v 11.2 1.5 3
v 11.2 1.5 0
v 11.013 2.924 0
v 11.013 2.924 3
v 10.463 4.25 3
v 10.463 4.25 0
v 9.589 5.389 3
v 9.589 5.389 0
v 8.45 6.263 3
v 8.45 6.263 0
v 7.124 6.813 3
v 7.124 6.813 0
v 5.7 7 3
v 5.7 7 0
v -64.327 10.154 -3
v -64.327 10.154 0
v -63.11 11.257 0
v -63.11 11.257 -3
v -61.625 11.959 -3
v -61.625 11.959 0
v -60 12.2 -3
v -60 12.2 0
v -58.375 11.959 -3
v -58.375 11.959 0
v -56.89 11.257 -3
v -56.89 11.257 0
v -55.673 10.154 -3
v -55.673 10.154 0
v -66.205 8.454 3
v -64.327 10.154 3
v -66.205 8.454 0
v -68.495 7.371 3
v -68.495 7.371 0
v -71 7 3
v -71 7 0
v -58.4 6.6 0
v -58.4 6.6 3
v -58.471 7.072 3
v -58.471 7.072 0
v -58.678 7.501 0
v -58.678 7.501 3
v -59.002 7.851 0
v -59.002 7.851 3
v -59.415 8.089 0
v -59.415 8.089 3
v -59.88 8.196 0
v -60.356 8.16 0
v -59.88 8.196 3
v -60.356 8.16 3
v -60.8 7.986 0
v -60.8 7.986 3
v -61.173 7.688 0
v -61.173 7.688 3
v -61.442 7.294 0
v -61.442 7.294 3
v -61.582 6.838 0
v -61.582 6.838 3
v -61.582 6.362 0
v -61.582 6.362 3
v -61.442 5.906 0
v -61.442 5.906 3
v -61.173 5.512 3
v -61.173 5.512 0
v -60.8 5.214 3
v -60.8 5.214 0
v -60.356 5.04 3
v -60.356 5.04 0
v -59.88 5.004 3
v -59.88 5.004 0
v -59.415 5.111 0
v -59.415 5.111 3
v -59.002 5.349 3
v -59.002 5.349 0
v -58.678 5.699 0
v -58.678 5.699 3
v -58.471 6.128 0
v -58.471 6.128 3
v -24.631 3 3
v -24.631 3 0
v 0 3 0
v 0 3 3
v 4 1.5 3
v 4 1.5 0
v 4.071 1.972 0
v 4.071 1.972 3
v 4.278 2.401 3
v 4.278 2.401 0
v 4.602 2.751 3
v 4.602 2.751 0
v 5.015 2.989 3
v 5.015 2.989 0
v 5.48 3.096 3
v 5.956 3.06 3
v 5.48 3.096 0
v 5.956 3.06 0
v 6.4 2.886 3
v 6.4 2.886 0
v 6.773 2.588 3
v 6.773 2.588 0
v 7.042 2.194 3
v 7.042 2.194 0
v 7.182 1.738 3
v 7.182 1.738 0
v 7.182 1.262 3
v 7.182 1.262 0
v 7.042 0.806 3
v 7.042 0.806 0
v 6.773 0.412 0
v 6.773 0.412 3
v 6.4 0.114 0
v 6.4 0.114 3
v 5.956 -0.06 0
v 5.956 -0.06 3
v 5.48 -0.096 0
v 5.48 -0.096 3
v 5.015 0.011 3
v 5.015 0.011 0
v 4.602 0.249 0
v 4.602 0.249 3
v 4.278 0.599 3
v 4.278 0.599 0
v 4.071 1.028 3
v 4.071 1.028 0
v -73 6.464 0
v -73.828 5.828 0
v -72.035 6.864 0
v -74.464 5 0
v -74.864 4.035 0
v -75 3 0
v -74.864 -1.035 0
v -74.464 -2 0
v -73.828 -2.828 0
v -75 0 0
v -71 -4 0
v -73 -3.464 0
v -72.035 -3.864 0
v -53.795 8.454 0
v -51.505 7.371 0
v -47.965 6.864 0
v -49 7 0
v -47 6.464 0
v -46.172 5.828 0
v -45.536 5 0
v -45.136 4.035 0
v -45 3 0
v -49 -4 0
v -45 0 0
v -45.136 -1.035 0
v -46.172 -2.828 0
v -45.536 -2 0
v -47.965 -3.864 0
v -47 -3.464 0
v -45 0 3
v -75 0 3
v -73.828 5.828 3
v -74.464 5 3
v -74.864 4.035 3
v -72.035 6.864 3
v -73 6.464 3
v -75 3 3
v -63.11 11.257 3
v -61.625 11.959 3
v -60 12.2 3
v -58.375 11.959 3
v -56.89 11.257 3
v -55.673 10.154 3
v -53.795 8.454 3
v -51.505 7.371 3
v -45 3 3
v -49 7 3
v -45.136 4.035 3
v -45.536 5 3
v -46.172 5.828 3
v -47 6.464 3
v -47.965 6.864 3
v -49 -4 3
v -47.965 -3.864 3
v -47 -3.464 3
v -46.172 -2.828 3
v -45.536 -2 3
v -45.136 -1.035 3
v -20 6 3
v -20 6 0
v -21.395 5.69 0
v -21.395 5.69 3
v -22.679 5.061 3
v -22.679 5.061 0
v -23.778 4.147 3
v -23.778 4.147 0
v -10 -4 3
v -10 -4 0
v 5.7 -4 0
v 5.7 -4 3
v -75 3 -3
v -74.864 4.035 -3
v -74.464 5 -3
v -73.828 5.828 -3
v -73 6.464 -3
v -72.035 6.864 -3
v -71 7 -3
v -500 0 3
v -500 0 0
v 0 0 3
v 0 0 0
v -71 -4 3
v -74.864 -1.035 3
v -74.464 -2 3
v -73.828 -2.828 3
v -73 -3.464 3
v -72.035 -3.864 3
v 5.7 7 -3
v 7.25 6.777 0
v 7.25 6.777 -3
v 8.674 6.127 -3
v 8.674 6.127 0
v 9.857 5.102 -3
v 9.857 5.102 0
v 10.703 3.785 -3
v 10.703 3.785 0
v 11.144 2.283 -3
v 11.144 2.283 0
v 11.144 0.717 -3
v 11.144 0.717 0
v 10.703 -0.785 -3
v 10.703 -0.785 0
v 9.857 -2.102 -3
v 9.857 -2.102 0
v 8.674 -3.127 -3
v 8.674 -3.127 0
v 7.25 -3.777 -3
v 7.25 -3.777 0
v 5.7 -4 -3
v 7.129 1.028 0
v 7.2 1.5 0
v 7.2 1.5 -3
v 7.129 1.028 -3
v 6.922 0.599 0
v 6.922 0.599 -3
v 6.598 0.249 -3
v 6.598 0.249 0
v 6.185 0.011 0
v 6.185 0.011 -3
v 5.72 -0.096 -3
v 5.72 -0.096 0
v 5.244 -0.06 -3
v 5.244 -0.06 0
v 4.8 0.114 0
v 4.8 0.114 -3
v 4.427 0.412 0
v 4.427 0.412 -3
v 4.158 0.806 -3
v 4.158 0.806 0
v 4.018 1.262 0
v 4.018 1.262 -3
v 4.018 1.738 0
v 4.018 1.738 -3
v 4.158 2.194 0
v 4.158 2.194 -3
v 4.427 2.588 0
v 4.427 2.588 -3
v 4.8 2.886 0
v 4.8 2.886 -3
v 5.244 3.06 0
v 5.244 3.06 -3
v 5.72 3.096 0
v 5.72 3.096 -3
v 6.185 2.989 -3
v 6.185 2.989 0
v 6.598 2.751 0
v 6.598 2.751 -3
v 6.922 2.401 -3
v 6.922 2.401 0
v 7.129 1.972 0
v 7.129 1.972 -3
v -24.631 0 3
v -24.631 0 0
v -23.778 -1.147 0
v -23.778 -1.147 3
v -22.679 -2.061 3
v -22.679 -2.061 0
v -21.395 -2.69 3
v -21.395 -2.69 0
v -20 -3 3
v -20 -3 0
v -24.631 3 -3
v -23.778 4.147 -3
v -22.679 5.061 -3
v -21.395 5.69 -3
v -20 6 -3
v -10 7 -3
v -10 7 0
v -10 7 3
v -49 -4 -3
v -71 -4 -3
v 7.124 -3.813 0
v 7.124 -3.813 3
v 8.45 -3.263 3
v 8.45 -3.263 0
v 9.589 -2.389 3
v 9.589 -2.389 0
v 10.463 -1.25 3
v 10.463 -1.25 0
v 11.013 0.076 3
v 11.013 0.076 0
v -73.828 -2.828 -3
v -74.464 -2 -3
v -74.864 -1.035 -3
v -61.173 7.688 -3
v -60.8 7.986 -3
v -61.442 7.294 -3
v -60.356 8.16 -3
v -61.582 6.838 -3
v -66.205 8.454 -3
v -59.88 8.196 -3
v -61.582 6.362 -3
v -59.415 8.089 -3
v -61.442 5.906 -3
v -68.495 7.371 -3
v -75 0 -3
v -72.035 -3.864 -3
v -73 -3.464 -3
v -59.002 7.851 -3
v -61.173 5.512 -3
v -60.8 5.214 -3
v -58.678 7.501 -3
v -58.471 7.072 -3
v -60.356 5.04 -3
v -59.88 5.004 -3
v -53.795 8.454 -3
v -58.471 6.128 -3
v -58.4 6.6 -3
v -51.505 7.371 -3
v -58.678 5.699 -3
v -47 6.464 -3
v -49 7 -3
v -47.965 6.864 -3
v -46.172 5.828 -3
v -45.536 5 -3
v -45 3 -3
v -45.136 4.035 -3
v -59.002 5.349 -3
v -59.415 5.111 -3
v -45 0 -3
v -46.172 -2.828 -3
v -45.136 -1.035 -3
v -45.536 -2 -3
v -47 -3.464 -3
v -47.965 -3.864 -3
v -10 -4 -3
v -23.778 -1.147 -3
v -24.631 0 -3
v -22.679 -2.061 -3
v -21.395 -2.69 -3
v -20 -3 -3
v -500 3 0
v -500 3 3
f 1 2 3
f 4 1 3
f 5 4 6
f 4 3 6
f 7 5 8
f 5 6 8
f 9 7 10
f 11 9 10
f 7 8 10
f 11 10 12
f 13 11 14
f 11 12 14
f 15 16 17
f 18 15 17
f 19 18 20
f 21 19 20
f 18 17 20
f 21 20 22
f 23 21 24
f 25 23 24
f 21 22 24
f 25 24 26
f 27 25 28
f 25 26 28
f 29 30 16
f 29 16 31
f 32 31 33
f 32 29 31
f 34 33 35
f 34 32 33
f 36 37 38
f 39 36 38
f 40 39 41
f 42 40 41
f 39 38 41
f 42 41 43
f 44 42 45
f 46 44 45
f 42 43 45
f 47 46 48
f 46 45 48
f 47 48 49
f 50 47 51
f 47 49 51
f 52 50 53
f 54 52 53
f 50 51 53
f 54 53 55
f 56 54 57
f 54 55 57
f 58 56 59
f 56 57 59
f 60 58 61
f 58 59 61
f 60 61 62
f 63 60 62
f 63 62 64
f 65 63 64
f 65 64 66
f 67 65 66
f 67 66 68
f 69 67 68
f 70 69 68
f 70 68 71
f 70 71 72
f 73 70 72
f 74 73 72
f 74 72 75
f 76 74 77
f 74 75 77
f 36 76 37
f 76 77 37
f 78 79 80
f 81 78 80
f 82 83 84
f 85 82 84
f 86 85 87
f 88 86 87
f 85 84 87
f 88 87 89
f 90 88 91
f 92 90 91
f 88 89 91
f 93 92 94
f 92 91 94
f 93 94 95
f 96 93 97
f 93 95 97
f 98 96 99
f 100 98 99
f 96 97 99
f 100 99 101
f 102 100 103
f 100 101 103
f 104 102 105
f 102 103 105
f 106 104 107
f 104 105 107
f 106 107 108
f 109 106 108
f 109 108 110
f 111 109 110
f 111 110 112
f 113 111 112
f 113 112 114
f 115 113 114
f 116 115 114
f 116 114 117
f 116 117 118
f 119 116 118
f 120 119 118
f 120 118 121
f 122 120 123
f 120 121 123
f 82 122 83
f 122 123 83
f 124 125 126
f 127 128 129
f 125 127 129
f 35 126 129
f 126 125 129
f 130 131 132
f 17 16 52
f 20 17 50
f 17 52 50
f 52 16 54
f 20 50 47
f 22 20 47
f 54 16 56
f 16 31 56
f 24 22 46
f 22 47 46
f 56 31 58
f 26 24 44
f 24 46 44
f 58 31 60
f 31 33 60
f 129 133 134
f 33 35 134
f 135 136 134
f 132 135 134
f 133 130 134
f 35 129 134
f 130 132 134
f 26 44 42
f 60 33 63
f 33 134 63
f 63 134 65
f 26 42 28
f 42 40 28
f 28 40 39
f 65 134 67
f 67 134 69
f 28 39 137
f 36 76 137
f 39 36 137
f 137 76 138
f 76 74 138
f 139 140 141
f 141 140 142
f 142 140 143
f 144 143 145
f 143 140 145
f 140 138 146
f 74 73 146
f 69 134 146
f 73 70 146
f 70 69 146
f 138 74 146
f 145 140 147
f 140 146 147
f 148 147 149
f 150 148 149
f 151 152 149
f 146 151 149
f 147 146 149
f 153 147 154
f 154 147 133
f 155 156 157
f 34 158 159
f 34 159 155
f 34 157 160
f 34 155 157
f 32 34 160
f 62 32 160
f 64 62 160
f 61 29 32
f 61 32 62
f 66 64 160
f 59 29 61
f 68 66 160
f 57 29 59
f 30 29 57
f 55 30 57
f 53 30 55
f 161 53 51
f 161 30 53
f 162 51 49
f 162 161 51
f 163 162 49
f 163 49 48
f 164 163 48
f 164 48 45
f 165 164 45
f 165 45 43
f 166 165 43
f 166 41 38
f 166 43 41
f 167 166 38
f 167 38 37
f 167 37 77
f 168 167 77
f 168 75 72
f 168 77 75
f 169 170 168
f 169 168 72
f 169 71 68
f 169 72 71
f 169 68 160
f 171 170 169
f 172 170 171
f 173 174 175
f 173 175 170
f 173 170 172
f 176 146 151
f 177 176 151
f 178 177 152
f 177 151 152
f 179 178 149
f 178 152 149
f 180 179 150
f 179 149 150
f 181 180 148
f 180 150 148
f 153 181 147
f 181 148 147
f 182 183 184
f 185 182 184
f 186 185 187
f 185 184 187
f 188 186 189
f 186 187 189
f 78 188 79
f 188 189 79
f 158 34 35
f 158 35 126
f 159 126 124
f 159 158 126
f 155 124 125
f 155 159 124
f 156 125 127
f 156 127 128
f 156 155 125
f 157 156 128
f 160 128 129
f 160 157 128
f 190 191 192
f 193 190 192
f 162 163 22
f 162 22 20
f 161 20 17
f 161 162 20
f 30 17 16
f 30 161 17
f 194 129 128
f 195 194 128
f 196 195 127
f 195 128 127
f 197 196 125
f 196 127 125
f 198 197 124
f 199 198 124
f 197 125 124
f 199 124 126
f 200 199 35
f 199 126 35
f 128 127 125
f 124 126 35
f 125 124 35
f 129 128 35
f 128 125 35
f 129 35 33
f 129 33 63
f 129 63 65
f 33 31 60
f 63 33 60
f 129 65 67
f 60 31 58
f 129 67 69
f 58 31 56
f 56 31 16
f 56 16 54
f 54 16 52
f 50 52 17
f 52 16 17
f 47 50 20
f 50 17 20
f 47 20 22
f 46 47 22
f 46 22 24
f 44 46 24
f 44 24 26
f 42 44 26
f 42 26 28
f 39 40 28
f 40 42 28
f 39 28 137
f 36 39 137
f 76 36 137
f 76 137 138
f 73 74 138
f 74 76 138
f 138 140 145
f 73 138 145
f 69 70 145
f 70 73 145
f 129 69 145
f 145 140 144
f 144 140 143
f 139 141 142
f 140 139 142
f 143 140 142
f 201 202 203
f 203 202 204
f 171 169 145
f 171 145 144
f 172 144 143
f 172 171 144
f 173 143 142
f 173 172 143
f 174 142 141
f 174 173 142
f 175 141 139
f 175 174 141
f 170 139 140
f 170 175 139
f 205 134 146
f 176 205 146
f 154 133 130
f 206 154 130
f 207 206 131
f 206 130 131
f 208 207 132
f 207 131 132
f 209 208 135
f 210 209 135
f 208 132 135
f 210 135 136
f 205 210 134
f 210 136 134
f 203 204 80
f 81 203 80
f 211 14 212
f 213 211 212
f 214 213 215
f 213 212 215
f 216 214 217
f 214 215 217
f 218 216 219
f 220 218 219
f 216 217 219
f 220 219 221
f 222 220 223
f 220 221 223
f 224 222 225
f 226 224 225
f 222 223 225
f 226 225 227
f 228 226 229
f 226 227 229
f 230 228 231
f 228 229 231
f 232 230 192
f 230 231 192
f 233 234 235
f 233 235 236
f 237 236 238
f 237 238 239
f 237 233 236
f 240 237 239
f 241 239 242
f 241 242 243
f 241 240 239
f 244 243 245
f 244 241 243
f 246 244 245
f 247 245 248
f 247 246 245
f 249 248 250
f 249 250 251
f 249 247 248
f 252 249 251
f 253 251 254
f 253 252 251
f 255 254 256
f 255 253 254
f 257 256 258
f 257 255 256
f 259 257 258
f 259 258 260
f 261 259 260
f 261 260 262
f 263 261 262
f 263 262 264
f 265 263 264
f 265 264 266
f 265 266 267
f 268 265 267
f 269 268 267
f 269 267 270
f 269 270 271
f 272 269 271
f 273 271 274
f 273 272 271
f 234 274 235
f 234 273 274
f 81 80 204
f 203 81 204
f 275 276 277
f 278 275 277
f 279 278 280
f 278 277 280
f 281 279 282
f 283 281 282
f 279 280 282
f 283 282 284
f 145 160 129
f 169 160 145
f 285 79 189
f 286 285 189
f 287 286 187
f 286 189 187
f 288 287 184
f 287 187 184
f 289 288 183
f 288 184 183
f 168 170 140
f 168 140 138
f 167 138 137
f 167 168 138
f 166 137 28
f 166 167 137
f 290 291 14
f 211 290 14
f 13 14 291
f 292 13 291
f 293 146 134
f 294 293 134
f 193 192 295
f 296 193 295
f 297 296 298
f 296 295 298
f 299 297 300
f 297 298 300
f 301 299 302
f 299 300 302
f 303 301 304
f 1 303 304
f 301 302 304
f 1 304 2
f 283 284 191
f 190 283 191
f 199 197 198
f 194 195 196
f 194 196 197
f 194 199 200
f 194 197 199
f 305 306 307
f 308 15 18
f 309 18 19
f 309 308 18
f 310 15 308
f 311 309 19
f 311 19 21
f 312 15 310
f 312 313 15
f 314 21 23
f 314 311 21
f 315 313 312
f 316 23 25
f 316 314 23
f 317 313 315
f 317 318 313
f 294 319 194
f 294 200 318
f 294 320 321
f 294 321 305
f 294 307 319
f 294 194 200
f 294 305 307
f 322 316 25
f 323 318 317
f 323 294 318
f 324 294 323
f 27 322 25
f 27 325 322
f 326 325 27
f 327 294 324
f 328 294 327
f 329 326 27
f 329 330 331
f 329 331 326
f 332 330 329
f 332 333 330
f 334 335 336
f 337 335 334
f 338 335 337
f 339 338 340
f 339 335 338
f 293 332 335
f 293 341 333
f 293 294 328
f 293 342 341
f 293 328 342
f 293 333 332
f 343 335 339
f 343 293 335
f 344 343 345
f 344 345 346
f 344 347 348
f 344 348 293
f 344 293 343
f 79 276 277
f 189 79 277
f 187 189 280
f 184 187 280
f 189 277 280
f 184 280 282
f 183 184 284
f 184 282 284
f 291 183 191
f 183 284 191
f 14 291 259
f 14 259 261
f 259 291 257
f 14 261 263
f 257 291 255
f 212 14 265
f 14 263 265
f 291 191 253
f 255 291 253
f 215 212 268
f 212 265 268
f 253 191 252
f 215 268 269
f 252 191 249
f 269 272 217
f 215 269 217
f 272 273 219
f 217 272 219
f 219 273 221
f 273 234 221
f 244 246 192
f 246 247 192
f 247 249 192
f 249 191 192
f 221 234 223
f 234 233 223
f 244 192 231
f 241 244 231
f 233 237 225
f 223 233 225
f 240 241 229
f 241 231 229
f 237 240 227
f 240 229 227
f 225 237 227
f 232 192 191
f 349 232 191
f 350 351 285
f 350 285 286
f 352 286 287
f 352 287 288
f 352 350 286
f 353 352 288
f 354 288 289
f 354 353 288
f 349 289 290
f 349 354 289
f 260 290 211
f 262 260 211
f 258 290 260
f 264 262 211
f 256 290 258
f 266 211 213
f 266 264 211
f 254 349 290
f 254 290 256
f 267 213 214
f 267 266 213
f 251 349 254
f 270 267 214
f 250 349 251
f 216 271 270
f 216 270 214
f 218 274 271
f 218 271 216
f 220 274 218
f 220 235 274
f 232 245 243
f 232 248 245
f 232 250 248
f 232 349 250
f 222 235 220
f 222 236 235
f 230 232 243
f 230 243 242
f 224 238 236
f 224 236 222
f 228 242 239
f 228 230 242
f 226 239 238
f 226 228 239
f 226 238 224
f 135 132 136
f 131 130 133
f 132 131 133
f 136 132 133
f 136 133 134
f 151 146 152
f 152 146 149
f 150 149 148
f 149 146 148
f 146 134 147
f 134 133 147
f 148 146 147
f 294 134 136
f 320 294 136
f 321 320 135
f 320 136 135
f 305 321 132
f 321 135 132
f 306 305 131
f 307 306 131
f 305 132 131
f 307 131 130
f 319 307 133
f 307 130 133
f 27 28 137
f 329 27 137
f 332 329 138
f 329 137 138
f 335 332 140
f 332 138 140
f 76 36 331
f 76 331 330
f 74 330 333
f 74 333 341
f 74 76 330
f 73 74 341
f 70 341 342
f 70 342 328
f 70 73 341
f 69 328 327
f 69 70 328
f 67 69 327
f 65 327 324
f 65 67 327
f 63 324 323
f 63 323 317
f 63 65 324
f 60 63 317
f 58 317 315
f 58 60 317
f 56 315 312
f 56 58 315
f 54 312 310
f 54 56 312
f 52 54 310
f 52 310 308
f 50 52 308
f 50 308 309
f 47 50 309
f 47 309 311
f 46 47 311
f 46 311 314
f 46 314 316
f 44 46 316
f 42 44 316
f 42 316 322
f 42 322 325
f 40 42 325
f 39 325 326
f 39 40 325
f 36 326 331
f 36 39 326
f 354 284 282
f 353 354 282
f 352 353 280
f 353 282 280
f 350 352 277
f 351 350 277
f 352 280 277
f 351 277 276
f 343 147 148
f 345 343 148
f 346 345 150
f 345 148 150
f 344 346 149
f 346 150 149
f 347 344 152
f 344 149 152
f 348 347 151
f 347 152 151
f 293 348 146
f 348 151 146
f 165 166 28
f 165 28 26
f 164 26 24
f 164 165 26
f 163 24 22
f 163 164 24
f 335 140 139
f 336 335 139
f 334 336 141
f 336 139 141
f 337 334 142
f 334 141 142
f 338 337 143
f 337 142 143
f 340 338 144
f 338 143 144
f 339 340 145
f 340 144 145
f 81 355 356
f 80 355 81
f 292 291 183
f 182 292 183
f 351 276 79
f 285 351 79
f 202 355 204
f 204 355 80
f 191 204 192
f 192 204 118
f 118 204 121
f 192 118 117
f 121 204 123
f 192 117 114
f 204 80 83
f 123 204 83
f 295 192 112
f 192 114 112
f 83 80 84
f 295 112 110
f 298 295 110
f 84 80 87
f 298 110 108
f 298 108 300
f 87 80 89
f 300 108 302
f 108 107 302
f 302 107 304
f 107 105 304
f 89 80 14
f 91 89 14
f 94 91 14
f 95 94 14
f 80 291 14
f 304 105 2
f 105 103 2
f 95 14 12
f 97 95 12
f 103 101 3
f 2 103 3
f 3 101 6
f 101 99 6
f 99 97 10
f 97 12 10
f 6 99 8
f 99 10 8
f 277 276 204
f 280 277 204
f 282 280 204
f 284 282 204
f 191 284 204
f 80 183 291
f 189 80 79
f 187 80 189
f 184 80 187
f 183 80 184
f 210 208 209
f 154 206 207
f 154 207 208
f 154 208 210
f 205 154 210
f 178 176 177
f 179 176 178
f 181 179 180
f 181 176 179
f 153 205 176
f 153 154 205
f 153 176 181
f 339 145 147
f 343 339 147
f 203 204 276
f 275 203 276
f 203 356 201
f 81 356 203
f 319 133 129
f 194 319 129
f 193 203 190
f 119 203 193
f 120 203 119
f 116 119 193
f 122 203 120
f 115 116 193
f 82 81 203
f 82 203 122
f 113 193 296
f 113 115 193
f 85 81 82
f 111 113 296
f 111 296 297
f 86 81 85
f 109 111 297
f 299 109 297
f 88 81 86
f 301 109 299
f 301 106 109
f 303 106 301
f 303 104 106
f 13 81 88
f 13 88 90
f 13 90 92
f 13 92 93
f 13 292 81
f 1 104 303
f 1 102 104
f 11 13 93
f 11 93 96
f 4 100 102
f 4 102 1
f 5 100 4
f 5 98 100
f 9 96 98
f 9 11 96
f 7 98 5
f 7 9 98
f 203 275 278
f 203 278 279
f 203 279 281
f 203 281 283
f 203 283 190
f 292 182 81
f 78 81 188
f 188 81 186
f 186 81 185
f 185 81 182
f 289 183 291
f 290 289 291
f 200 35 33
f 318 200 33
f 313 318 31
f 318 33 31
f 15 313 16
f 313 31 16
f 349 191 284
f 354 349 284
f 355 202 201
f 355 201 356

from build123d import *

# Parameters (mm, degrees)
F0_W      = 500
F0_H      = 3
F1_DEPTH  = 3
F3_DEPTH  = 3
F4_R      = 1.6
F5_DEPTH  = 3
F6_R      = 1.6
F7_DEPTH  = 3
F8_R      = 1.6
F9_DEPTH  = 3
F11_DEPTH = 3


with BuildPart() as f1:
    # F0 (on Top) → F1 (new body)
    with BuildSketch(Plane.XY):
        with Locations((-250, 1.5)):
            Rectangle(F0_W, F0_H)
    extrude(amount=F1_DEPTH)


with BuildPart() as f3:
    # F2 (on Top) → F3 (new body, through all)
    with BuildSketch(Plane.XY):
        with BuildLine():
            Line((0, 3), (0, 0))
            Line((0, 0), (-24.6306787322, 0))
            ThreePointArc((-24.6306787322, 0), (-22.678597813, -2.0607110548), (-20, -3))
            Line((-20, -3), (-10, -4))
            Line((-10, -4), (0, -4))
            Line((0, -4), (5.7, -4))
            ThreePointArc((5.7, -4), (9.5890872965, -2.3890872965), (11.2, 1.5))
            ThreePointArc((11.2, 1.5), (9.5890872965, 5.3890872965), (5.7, 7))
            Line((5.7, 7), (0, 7))
            Line((0, 7), (-10, 7))
            Line((-10, 7), (-20, 6))
            ThreePointArc((-20, 6), (-22.678597813, 5.0607110548), (-24.6306787322, 3))
            Line((-24.6306787322, 3), (0, 3))
        make_face()
        with BuildLine():
            ThreePointArc((7.2, 1.5), (5.6, -0.1), (4, 1.5))
            ThreePointArc((4, 1.5), (5.6, 3.1), (7.2, 1.5))
        make_face(mode=Mode.SUBTRACT)
    extrude(amount=F3_DEPTH)


with BuildPart() as f5:
    # F4 (on face) → F5 (new body)
    with BuildSketch(Plane(origin=(0, 0, 0), x_dir=(1, 0, 0), z_dir=(0, 0, -1))):
        with BuildLine():
            Line((5.7, 4), (-10, 4))
            Line((-10, 4), (-20, 3))
            ThreePointArc((-20, 3), (-22.678597813, 2.0607110548), (-24.6306787322, 0))
            Line((-24.6306787322, 0), (-24.6306787322, -3))
            ThreePointArc((-24.6306787322, -3), (-22.678597813, -5.0607110548), (-20, -6))
            Line((-20, -6), (-10, -7))
            Line((-10, -7), (5.7, -7))
            ThreePointArc((5.7, -7), (11.2, -1.5), (5.7, 4))
        make_face()
        with Locations((5.6, -1.5)):
            Circle(F4_R, mode=Mode.SUBTRACT)
    extrude(amount=F5_DEPTH)


with BuildPart() as f7:
    # F6 (on face) → F7 (new body, through all)
    with BuildSketch(Plane.XY.offset(3)):
        with BuildLine():
            Line((-75, 3), (-60, 3))
            Line((-60, 3), (-45, 3))
            ThreePointArc((-45, 3), (-46.1715728753, 5.8284271247), (-49, 7))
            ThreePointArc((-49, 7), (-52.6902586151, 7.8282990834), (-55.6725209403, 10.1542826263))
            ThreePointArc((-55.6725209403, 10.1542826263), (-57.6066741454, 11.6628046924), (-60, 12.2))
            ThreePointArc((-60, 12.2), (-62.3933258546, 11.6628046924), (-64.3274790597, 10.1542826263))
            ThreePointArc((-64.3274790597, 10.1542826263), (-67.3097413849, 7.8282990834), (-71, 7))
            ThreePointArc((-71, 7), (-73.8284271247, 5.8284271247), (-75, 3))
        make_face()
        with Locations((-60, 6.6)):
            Circle(F6_R, mode=Mode.SUBTRACT)
    extrude(amount=-F7_DEPTH)


with BuildPart() as f9:
    # F8 (on face) → F9 (new body)
    with BuildSketch(Plane(origin=(0, 0, 0), x_dir=(1, 0, 0), z_dir=(0, 0, -1))):
        with BuildLine():
            Line((-75, 0), (-75, -3))
            ThreePointArc((-75, -3), (-73.8284271247, -5.8284271247), (-71, -7))
            ThreePointArc((-71, -7), (-67.3097413849, -7.8282990834), (-64.3274790597, -10.1542826263))
            ThreePointArc((-64.3274790597, -10.1542826263), (-60, -12.2), (-55.6725209403, -10.1542826263))
            ThreePointArc((-55.6725209403, -10.1542826263), (-52.6902586151, -7.8282990834), (-49, -7))
            ThreePointArc((-49, -7), (-46.1715728753, -5.8284271247), (-45, -3))
            Line((-45, -3), (-45, 0))
            ThreePointArc((-45, 0), (-46.1715728753, 2.8284271247), (-49, 4))
            Line((-49, 4), (-71, 4))
            ThreePointArc((-71, 4), (-73.8284271247, 2.8284271247), (-75, 0))
        make_face()
        with Locations((-60, -6.6)):
            Circle(F8_R, mode=Mode.SUBTRACT)
    extrude(amount=F9_DEPTH)


with BuildPart() as f11:
    # F10 (on face) → F11 (new body, through all)
    with BuildSketch(Plane.XY):
        with BuildLine():
            ThreePointArc((-49, -4), (-46.1715728753, -2.8284271247), (-45, 0))
            Line((-45, 0), (-75, 0))
            ThreePointArc((-75, 0), (-73.8284271247, -2.8284271247), (-71, -4))
            Line((-71, -4), (-49, -4))
        make_face()
    extrude(amount=F11_DEPTH)


solid = Compound([f1.part, f3.part, f5.part, f7.part, f9.part, f11.part])
